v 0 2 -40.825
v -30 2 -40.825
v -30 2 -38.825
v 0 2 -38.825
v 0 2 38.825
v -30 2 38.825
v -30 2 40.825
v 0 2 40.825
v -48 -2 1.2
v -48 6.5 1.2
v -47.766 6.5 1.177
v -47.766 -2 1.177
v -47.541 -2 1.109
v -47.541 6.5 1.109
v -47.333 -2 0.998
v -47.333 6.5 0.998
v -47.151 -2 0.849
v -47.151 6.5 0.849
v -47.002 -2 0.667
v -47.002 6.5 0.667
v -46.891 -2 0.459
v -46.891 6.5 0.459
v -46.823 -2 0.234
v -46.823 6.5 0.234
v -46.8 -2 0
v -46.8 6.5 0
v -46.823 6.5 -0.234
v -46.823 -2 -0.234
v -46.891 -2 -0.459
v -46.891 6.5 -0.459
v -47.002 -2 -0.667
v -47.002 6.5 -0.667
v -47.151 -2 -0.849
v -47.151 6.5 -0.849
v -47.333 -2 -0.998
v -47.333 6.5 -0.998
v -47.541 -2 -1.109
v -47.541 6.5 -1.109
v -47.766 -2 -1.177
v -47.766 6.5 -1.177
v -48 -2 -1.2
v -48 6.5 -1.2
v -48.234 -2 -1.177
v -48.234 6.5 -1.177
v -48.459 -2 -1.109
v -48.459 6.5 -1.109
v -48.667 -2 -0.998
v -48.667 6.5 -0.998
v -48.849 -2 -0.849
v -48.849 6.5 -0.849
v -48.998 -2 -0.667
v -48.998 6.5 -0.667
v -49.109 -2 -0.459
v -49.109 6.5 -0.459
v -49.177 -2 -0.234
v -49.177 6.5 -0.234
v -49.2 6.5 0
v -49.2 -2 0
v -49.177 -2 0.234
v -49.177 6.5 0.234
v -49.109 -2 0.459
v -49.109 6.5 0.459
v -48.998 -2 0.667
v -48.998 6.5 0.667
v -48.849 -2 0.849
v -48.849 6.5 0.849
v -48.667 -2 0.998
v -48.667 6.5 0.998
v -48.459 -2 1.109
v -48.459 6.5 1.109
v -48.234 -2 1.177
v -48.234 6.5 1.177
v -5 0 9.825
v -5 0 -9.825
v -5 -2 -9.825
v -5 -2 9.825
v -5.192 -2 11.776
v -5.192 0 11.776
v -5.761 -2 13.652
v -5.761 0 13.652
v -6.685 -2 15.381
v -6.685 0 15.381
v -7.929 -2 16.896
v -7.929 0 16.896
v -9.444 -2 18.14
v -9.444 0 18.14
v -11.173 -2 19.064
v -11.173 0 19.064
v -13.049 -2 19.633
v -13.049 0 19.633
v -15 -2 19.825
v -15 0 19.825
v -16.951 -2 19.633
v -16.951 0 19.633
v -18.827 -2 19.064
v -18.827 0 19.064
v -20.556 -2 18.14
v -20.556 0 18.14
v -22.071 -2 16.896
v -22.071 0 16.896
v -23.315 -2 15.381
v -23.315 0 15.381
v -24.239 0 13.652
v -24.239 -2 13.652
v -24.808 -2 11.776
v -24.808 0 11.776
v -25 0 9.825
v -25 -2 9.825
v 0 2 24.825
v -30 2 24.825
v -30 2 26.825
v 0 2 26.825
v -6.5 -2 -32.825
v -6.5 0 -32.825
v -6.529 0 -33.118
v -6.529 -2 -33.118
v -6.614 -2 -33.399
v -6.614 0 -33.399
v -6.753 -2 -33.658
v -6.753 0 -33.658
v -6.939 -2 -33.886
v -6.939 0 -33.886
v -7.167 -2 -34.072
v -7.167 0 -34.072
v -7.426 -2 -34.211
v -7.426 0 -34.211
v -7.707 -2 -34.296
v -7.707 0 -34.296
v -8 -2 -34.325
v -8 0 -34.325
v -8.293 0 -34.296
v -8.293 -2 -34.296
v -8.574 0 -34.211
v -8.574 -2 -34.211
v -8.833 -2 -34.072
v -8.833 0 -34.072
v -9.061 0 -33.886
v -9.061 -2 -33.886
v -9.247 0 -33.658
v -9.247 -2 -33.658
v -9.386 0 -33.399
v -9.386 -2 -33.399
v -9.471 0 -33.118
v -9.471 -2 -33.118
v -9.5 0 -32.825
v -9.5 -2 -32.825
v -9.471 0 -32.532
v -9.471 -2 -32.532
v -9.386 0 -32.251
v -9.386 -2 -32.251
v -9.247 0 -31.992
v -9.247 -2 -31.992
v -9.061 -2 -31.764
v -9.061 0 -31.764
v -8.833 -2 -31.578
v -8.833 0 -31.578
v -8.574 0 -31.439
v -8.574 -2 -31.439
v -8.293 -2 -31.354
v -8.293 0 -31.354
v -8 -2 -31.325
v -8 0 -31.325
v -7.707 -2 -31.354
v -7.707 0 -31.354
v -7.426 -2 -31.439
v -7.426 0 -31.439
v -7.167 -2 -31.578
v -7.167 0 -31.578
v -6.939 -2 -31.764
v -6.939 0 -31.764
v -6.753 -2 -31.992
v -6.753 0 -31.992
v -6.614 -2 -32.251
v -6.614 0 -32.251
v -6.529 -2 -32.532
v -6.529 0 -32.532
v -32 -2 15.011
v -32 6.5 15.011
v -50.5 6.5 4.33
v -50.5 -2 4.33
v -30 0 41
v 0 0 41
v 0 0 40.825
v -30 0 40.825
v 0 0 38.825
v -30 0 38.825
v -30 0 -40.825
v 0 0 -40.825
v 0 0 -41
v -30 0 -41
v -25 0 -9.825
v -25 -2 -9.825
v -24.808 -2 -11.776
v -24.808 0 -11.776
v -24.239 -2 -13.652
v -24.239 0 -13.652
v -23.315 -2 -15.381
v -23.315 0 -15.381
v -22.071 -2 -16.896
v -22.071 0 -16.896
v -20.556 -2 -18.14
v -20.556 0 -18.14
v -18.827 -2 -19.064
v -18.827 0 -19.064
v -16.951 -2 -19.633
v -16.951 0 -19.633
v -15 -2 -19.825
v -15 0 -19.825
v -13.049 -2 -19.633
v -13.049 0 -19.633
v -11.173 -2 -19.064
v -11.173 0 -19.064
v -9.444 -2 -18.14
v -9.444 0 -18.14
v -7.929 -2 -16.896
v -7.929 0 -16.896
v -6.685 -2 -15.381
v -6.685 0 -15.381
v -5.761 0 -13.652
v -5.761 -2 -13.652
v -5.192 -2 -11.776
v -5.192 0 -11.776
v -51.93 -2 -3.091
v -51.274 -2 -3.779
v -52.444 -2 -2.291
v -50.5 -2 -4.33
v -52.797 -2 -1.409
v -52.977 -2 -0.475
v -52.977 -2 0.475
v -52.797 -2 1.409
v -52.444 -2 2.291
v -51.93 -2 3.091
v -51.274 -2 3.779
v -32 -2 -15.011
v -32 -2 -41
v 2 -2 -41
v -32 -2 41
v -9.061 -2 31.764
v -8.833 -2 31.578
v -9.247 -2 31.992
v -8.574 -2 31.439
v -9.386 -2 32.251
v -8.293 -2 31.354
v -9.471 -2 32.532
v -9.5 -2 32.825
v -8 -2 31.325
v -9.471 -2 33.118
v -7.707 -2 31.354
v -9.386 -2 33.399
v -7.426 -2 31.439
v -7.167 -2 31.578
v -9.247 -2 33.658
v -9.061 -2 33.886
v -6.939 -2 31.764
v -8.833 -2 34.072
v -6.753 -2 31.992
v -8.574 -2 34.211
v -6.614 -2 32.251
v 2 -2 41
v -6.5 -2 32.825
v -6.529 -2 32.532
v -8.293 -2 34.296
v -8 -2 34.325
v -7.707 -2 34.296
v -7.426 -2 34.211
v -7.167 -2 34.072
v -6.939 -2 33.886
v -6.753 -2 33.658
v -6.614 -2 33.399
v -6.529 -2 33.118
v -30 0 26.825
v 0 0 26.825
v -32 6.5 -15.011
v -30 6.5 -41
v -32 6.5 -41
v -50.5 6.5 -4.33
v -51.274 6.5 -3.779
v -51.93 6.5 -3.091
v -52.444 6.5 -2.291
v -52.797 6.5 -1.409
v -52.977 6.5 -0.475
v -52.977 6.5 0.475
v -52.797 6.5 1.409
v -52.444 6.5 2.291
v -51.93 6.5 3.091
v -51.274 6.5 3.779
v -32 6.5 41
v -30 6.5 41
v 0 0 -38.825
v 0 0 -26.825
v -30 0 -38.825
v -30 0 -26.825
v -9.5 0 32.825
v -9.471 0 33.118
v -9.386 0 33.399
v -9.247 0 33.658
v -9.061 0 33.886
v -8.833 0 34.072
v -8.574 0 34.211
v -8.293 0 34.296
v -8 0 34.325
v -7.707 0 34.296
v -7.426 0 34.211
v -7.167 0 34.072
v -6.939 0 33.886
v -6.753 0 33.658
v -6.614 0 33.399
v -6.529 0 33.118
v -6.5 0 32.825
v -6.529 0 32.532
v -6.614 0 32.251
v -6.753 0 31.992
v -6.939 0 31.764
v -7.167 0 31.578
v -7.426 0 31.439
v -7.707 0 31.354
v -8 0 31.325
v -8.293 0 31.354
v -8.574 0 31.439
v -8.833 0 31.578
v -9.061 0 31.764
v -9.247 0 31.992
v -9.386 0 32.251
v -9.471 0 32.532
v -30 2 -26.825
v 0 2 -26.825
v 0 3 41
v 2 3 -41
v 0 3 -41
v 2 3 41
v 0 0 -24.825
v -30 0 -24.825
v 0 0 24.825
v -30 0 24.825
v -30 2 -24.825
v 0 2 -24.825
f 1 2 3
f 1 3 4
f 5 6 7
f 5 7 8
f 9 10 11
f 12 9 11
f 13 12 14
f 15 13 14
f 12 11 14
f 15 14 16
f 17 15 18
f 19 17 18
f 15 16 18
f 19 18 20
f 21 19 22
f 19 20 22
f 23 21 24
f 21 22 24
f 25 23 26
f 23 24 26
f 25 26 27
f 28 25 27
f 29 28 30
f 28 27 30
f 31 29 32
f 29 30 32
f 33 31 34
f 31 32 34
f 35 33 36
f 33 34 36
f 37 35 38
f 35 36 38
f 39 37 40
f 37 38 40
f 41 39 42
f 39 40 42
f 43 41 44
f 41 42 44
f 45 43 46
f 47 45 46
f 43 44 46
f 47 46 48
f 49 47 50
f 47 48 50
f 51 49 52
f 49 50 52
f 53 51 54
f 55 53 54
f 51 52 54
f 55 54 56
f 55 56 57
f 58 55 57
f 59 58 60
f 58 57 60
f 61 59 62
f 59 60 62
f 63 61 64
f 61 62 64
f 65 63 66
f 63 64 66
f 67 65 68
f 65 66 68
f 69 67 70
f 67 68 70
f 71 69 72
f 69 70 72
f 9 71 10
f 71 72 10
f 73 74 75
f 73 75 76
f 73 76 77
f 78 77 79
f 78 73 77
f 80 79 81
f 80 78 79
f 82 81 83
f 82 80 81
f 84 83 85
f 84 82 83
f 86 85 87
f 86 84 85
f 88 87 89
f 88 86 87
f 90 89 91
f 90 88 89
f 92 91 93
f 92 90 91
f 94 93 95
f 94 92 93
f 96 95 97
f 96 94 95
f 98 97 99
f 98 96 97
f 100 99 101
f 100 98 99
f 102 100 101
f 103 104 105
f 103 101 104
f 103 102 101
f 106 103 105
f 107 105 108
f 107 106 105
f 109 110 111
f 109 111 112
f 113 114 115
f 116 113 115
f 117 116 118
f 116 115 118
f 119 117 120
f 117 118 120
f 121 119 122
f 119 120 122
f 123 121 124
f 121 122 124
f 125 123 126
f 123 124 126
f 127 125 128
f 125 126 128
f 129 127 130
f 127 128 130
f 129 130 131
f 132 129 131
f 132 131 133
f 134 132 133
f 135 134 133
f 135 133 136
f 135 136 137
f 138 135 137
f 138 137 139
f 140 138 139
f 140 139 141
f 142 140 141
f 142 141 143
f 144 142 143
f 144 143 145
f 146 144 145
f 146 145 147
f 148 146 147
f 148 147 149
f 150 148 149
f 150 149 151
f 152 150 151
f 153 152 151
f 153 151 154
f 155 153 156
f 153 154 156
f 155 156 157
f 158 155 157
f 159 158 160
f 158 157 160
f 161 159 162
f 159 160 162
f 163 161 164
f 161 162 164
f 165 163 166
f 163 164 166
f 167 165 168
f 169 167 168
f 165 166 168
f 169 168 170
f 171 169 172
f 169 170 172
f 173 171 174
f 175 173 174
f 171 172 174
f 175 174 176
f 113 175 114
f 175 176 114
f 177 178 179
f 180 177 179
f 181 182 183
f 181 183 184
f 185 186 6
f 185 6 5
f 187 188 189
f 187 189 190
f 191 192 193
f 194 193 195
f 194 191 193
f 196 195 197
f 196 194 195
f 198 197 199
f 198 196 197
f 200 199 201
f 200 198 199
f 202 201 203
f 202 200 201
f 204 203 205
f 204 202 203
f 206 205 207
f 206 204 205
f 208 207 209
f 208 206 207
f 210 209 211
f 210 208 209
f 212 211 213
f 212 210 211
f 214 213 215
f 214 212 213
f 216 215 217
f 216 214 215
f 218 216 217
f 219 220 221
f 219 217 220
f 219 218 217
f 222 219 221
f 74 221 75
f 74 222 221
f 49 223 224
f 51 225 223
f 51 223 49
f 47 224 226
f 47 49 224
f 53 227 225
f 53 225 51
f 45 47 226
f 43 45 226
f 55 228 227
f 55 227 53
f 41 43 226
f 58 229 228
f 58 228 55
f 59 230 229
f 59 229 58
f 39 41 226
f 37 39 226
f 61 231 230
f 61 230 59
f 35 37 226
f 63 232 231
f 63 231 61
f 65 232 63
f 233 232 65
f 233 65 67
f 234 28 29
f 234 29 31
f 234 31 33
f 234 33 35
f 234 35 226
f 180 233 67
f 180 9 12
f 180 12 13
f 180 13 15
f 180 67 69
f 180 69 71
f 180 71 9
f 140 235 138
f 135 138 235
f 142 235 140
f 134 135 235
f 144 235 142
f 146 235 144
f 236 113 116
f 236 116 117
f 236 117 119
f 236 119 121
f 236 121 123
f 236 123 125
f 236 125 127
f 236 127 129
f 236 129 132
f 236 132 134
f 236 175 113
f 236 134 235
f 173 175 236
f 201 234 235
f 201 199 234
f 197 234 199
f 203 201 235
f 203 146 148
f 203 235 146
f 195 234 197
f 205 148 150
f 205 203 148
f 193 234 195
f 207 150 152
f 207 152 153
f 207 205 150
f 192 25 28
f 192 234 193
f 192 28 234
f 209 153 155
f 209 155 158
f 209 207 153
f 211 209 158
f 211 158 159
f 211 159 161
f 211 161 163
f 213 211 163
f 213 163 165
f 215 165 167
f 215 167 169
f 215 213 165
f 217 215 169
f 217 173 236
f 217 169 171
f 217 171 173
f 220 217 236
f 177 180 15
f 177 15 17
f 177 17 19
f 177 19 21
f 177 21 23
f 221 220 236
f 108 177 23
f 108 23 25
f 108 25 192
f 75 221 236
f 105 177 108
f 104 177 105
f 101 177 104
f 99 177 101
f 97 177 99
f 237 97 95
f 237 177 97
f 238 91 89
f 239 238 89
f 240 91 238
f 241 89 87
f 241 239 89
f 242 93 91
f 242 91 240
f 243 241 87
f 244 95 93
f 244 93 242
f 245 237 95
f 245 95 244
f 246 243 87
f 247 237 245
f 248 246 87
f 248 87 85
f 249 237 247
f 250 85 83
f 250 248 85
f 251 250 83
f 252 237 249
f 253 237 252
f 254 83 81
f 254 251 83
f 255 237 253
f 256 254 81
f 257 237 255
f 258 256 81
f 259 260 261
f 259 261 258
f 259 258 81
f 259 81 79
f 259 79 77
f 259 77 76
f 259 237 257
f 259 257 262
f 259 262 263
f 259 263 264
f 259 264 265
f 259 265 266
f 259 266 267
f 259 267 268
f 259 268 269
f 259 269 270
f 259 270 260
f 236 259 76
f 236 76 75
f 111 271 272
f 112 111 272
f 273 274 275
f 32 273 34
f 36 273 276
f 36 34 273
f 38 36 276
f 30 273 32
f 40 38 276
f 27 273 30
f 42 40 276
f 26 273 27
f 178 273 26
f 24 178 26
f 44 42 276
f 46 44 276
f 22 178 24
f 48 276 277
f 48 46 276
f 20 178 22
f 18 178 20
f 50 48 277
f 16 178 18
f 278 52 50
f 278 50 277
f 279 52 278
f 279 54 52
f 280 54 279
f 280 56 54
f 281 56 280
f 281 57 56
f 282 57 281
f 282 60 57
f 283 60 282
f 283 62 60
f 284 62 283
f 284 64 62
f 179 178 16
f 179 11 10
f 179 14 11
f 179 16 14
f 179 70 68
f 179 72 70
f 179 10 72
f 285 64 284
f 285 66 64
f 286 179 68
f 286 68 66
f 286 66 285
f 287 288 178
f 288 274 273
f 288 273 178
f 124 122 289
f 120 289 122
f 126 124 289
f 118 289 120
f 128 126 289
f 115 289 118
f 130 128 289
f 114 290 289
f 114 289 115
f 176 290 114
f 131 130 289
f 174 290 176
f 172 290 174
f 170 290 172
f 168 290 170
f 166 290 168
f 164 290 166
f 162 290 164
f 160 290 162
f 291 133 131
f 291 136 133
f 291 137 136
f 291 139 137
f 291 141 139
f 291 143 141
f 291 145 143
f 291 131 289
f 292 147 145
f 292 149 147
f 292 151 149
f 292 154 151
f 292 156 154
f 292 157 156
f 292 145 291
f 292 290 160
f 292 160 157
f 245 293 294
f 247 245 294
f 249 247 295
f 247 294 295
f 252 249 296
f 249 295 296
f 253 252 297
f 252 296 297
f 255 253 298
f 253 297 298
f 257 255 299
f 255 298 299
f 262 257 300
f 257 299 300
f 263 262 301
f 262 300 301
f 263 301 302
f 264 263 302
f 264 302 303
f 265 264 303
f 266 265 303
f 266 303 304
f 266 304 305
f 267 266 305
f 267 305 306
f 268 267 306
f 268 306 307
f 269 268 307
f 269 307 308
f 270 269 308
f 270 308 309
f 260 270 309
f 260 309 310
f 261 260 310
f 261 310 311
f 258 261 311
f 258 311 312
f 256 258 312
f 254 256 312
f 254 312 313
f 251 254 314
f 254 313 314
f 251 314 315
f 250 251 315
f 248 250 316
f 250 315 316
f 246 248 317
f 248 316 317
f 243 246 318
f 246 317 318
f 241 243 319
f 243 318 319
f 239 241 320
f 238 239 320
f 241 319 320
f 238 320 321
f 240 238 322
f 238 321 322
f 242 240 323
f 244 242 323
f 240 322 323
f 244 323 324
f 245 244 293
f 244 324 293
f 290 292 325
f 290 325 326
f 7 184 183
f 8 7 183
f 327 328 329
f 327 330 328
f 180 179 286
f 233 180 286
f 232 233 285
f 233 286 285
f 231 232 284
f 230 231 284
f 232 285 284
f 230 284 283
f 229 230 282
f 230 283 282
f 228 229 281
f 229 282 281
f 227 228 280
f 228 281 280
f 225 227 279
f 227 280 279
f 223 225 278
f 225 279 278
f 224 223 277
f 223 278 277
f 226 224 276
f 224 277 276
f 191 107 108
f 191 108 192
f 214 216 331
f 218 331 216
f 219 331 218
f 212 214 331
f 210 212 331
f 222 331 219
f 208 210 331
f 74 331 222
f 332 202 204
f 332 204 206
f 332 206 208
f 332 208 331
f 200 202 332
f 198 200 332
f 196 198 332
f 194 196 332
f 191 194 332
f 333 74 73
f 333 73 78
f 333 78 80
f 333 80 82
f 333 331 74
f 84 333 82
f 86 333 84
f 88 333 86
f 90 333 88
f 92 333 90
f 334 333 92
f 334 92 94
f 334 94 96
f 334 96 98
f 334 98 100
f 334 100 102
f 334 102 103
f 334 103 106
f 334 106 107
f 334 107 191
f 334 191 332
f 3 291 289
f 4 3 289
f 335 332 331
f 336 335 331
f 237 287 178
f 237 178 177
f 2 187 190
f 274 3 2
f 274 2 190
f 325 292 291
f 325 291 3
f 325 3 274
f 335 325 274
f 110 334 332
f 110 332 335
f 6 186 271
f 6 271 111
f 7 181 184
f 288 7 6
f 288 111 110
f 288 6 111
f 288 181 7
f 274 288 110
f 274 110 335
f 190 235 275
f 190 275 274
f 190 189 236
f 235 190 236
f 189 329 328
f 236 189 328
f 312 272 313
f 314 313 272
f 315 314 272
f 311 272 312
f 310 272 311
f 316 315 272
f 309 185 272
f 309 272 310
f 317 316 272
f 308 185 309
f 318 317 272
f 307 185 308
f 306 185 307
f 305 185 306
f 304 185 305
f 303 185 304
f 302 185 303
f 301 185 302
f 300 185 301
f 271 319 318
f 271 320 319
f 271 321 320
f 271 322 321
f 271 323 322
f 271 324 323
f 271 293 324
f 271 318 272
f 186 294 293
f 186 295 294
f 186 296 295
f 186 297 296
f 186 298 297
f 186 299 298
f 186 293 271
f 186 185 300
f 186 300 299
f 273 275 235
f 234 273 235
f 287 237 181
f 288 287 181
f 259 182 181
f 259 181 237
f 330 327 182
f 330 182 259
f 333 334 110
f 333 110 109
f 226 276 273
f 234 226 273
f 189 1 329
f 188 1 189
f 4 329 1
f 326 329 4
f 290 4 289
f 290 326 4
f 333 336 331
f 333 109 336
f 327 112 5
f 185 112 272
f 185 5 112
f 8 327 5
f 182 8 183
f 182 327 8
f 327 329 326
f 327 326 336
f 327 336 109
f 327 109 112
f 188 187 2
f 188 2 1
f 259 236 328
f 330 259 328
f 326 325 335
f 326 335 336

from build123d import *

# Parameters (mm, degrees)
EXTRU_MINCE1_DEPTH      = 41
ESQUISSE2_R             = 1.5
ENL_V_MAT_EXTRU_1_DEPTH = 53.414215629
ESQUISSE3_W             = 30
ESQUISSE3_H             = 2
BOSS_EXTRU_1_DEPTH      = 2
ENL_V_MAT_EXTRU_2_DEPTH = 53.414215629
ESQUISSE5_R             = 1.2
BOSS_EXTRU_2_DEPTH      = 8.5


with BuildPart() as part:
    # Esquisse1 → Extru.-Mince1 (new, symmetric)
    with BuildSketch(Plane.XY):
        Polygon((0, 3), (0, 0), (-30, 0), (-30, 6.5), (-32, 6.5), (-32, -2), (2, -2), (2, 3), align=None)
    extrude(amount=EXTRU_MINCE1_DEPTH, both=True)

    # Esquisse2 → Enlèv. mat.-Extru.1 (cut, through all)
    with BuildSketch(Plane(origin=(0, 0, 0), x_dir=(1, 0, 0), z_dir=(0, 1, 0))):
        with Locations(Location((-8, -32.825, 0), (0, 0, 180))):
            Circle(ESQUISSE2_R)
        with Locations((-8, 32.825)):
            Circle(ESQUISSE2_R)
    extrude(amount=-ENL_V_MAT_EXTRU_1_DEPTH, mode=Mode.SUBTRACT)

    # Esquisse3 → Boss.-Extru.1 (add)
    with BuildSketch(Plane(origin=(0, 0, 0), x_dir=(1, 0, 0), z_dir=(0, 1, 0))):
        with Locations((-15, 25.825)):
            Rectangle(ESQUISSE3_W, ESQUISSE3_H)
        with Locations((-15, -25.825)):
            Rectangle(ESQUISSE3_W, ESQUISSE3_H)
        with Locations((-15, -39.825)):
            Rectangle(ESQUISSE3_W, ESQUISSE3_H)
        with Locations((-15, 39.825)):
            Rectangle(ESQUISSE3_W, ESQUISSE3_H)
    extrude(amount=BOSS_EXTRU_1_DEPTH)

    # Esquisse4 → Enlèv. mat.-Extru.2 (cut, through all)
    with BuildSketch(Plane(origin=(0, 0, 0), x_dir=(1, 0, 0), z_dir=(0, 1, 0))):
        with BuildLine():
            Line((-5, 9.825), (-5, -9.825))
            ThreePointArc((-5, -9.825), (-15, -19.825), (-25, -9.825))
            Line((-25, -9.825), (-25, 9.825))
            ThreePointArc((-25, 9.825), (-15, 19.825), (-5, 9.825))
        make_face()
    extrude(amount=-ENL_V_MAT_EXTRU_2_DEPTH, mode=Mode.SUBTRACT)

    # Esquisse5 → Boss.-Extru.2 (add)
    with BuildSketch(Plane(origin=(0, 6.5, 0), x_dir=(1, 0, 0), z_dir=(0, 1, 0))):
        with BuildLine():
            Line((-50.5, 4.330127019), (-32, 15.011106999))
            Line((-32, 15.011106999), (-32, -15.011106999))
            Line((-32, -15.011106999), (-50.5, -4.330127019))
            ThreePointArc((-50.5, -4.330127019), (-53, 0), (-50.5, 4.330127019))
        make_face()
        with Locations(Location((-48, 0, 0), (0, 0, 270))):
            Circle(ESQUISSE5_R, mode=Mode.SUBTRACT)
    extrude(amount=-BOSS_EXTRU_2_DEPTH)


solid = part.part
